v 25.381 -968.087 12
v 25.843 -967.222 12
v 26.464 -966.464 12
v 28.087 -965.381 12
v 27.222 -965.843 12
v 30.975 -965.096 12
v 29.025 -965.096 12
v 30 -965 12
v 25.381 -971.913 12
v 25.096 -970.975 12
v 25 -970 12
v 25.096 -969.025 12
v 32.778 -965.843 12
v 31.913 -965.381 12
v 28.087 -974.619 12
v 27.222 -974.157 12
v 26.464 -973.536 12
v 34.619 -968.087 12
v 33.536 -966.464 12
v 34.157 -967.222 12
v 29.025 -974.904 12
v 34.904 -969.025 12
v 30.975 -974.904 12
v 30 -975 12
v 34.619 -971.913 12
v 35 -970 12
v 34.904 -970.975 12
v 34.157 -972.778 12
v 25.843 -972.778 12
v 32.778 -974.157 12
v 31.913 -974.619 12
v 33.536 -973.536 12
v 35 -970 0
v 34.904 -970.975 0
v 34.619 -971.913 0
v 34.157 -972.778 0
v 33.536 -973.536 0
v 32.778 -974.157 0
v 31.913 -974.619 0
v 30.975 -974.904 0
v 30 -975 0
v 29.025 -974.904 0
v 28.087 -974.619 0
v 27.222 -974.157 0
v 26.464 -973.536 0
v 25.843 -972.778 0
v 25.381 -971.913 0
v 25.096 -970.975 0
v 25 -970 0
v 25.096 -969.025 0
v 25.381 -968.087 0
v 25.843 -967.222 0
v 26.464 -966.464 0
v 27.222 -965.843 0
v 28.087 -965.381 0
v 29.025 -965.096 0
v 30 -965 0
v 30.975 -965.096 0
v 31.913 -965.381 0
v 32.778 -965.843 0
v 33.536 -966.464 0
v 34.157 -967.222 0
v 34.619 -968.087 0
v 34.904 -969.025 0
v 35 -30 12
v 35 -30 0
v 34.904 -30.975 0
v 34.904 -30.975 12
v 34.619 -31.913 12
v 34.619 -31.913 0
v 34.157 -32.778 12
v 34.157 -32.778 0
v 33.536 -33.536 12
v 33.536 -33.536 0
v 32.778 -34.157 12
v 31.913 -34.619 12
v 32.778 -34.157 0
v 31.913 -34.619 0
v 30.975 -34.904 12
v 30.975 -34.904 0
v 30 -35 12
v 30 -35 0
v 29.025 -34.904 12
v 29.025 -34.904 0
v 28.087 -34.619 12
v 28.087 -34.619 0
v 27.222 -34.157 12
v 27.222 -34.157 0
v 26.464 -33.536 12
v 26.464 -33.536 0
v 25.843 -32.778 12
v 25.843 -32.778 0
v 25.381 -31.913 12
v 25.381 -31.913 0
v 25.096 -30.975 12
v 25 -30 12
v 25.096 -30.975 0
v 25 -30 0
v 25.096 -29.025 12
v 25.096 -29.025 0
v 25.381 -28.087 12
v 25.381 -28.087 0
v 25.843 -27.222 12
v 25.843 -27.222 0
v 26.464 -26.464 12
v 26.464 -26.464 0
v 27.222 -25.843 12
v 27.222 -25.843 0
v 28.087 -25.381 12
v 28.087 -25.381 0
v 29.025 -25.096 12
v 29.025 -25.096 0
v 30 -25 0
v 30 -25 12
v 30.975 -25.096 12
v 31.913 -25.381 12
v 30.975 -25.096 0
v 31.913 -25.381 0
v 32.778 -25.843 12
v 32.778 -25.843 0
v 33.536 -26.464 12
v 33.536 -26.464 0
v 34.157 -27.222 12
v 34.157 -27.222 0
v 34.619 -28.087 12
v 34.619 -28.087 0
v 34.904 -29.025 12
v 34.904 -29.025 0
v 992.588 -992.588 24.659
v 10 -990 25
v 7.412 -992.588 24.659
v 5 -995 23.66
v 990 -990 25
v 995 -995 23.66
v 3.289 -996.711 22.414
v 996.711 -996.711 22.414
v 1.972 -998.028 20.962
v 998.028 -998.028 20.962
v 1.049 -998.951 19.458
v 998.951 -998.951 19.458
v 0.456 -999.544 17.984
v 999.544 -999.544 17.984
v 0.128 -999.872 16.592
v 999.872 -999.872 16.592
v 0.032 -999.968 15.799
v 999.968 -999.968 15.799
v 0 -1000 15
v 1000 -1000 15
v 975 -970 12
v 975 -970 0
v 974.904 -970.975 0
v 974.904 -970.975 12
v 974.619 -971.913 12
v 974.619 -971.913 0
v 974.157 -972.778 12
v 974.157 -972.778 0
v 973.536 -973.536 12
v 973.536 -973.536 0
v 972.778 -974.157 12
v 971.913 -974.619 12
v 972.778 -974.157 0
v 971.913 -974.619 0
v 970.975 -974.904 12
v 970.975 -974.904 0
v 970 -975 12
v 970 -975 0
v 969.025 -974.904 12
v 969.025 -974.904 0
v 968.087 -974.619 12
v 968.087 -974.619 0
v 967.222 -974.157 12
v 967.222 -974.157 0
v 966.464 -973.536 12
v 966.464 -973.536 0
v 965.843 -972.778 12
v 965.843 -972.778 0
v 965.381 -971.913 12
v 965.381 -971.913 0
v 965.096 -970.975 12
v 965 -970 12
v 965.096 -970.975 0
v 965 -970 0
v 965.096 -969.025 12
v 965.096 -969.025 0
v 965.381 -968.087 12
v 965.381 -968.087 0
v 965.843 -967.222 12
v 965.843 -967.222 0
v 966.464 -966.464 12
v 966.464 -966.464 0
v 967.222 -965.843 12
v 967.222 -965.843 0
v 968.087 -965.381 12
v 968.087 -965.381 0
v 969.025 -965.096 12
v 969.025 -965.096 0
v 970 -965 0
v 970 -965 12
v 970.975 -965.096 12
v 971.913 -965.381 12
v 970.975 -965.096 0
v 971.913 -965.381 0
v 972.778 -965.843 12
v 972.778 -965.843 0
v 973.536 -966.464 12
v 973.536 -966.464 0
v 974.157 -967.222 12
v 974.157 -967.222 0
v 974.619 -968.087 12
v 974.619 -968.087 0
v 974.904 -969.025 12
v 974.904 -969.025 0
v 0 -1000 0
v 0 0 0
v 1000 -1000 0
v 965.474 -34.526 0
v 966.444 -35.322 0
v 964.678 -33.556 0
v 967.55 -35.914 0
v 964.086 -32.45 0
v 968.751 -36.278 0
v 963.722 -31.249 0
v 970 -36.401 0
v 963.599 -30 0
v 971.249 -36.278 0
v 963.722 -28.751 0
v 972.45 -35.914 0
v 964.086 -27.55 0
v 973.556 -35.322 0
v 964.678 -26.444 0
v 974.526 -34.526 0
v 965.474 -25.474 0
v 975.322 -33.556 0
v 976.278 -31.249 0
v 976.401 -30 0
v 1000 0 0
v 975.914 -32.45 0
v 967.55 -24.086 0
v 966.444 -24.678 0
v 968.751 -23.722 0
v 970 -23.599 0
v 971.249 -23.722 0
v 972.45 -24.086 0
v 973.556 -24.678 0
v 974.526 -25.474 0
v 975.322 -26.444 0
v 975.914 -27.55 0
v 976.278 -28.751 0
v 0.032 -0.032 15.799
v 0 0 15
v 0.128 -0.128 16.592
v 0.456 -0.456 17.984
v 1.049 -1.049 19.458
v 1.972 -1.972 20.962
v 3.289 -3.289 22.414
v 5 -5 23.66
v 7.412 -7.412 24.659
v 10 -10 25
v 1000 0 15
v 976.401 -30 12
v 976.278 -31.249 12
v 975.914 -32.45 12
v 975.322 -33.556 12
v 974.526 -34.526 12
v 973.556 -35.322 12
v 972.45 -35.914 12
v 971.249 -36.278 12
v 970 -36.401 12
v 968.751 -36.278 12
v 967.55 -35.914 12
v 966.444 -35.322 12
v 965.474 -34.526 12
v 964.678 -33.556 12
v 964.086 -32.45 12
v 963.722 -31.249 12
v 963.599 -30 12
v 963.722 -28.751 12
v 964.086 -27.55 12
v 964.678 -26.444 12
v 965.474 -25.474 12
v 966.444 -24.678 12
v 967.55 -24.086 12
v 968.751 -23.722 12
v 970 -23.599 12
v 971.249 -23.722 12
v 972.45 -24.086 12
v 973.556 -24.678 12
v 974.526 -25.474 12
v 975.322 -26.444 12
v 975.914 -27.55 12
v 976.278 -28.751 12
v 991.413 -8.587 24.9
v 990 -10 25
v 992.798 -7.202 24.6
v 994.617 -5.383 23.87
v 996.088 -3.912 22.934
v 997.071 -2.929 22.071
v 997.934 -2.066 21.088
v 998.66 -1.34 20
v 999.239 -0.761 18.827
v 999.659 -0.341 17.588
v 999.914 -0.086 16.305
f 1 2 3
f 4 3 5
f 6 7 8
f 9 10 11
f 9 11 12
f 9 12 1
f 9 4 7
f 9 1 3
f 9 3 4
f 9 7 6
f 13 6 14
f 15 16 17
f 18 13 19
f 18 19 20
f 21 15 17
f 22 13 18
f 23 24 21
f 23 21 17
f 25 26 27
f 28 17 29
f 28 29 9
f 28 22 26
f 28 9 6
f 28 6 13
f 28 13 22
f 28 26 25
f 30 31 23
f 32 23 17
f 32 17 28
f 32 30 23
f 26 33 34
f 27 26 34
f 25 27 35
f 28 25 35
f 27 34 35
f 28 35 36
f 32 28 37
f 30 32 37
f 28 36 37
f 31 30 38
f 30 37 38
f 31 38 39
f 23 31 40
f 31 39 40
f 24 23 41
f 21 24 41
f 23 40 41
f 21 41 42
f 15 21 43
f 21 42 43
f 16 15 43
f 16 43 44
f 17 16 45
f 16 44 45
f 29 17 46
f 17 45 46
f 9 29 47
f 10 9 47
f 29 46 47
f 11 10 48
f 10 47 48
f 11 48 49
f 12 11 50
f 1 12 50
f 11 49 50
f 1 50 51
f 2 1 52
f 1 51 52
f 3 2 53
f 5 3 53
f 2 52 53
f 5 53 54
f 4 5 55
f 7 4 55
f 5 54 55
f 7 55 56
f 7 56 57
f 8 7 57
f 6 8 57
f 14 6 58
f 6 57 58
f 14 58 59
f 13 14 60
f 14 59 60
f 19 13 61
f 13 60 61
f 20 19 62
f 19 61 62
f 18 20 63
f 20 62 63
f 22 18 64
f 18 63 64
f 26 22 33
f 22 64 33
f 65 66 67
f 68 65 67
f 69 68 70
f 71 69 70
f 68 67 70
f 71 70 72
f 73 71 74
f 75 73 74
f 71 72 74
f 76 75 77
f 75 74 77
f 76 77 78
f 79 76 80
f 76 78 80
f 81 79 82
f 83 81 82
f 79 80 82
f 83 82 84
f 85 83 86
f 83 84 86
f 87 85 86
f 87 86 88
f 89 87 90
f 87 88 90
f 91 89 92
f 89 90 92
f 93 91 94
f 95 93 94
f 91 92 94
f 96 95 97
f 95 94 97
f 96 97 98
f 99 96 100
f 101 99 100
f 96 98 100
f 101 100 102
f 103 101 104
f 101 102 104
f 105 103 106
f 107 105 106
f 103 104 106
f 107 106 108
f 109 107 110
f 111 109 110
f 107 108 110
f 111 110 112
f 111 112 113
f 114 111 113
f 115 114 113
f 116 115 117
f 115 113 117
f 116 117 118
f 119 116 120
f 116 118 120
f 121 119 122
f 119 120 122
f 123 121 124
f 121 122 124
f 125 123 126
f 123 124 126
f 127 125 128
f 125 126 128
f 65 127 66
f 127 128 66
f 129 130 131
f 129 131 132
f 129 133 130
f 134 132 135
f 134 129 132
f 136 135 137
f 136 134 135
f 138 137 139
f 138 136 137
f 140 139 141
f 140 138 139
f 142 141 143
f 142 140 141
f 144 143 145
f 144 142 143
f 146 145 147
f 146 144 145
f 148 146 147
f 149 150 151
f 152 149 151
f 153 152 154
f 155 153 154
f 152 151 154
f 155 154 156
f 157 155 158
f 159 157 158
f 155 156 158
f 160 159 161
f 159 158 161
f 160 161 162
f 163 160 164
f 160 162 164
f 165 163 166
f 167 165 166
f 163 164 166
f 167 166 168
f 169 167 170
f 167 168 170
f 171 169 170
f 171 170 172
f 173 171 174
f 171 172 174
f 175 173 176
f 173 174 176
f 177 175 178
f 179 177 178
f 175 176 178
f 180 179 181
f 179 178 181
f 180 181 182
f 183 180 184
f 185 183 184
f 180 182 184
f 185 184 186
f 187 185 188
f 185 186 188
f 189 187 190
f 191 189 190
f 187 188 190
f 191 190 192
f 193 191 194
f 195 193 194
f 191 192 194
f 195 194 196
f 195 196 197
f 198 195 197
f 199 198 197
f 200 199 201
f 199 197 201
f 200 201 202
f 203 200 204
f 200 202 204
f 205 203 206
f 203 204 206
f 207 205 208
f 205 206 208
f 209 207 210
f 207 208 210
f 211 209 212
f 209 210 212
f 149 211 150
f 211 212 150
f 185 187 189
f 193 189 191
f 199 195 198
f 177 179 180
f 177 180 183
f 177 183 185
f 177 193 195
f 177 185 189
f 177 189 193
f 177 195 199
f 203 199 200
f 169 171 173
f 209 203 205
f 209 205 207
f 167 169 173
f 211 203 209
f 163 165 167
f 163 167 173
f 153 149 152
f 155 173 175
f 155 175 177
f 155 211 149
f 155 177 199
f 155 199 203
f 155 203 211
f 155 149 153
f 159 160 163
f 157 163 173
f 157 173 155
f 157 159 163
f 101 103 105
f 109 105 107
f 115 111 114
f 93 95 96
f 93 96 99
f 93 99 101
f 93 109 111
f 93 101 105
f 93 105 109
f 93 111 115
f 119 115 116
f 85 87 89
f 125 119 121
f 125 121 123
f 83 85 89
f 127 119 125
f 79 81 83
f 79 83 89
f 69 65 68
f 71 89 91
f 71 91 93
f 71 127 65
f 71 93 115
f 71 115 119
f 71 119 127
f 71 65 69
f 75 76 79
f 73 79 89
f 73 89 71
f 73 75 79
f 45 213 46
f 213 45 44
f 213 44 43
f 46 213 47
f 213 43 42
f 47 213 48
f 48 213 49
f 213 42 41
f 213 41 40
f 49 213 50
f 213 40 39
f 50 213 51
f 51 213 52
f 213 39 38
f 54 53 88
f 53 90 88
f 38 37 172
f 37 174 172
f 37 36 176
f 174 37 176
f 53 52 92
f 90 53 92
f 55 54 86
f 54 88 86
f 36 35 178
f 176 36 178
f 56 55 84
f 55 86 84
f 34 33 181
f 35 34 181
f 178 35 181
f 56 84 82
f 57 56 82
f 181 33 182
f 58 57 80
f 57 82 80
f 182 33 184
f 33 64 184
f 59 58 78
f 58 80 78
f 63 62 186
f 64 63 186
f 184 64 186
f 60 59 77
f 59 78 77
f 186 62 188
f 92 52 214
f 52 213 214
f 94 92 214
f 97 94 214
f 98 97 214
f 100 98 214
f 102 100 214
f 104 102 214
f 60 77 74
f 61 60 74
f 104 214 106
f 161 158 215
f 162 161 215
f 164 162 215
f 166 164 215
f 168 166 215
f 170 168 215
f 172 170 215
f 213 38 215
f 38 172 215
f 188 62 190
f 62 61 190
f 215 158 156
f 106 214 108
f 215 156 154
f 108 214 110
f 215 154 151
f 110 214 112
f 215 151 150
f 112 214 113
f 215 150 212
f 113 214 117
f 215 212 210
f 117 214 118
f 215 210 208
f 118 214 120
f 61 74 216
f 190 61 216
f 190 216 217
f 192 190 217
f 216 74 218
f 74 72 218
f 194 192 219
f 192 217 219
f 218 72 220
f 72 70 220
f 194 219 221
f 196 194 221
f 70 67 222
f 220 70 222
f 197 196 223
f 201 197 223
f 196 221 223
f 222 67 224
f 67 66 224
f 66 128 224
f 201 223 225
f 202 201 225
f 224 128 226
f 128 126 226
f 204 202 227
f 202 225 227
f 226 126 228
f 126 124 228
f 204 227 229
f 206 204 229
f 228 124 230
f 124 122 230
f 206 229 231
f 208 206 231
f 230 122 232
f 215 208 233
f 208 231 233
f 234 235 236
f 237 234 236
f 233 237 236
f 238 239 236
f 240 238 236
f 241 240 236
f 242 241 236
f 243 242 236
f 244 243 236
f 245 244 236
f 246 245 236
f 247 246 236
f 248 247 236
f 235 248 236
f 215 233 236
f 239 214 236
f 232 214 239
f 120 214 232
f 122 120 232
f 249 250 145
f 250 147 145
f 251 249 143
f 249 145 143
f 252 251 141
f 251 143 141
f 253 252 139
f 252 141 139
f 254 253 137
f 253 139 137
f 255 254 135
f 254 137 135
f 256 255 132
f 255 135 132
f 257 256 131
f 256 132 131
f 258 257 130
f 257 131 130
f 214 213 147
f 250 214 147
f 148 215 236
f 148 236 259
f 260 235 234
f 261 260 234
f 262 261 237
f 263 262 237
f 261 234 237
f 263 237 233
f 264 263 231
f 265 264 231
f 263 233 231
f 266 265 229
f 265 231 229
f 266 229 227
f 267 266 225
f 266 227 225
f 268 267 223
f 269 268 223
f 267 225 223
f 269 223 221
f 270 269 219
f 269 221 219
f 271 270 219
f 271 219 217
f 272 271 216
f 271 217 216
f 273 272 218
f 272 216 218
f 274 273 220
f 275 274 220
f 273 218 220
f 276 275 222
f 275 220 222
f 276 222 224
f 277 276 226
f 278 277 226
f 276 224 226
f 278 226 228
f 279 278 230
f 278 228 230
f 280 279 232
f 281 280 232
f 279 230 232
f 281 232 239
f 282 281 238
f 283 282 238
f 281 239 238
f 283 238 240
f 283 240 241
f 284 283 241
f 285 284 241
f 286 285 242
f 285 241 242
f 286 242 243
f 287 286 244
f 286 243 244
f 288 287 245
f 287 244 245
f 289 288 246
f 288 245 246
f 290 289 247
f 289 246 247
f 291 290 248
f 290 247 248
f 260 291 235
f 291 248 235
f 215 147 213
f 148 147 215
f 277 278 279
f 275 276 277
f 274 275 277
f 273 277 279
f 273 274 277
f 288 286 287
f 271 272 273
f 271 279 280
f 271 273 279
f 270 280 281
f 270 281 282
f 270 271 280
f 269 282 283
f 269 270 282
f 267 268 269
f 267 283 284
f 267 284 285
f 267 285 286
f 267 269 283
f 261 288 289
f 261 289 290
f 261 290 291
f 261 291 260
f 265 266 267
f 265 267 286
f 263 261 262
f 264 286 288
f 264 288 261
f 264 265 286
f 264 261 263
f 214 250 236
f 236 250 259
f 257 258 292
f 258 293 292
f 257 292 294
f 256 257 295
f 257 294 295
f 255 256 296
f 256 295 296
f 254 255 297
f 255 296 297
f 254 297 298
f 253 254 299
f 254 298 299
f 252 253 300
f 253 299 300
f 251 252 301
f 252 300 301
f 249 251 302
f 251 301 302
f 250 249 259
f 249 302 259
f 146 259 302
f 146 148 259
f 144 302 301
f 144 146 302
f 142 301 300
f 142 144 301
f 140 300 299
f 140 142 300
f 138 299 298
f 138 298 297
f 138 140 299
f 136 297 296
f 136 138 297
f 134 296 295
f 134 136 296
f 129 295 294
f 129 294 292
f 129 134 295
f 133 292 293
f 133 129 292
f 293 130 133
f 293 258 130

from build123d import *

# Parameters (mm, degrees)
F0_W      = 1000
F0_H      = 25
F1_DEPTH  = 1000
F2_R      = 10
F3_R      = 5
F4_DEPTH  = 12
F6_R      = 6.401236
F7_DEPTH  = 12
F5_R      = 5
F8_DEPTH  = 12
F9_R      = 5
F10_DEPTH = 12


with BuildPart() as f1:
    # F0 (on Front) → F1 (new body)
    with BuildSketch(Plane.XZ):
        with Locations((500, 12.5)):
            Rectangle(F0_W, F0_H)
    extrude(amount=F1_DEPTH)

    # F2
    f2_edges = [f1.edges().sort_by_distance(p)[0] for p in [
        (500, -1000, 25),
        (1000, -500, 25),
        (500, 0, 25),
        (0, -500, 25),
    ]]
    fillet(f2_edges, radius=F2_R)

    # F3 (on face) → F4 (cut)
    with BuildSketch(Plane(origin=(0, 0, 0), x_dir=(1, 0, 0), z_dir=(0, 0, -1))):
        with Locations((30, 970)):
            Circle(F3_R)
    extrude(amount=-F4_DEPTH, mode=Mode.SUBTRACT)

    # F6 (on face) → F7 (cut)
    with BuildSketch(Plane(origin=(0, 0, 0), x_dir=(1, 0, 0), z_dir=(0, 0, -1))):
        with Locations((970, 30)):
            Circle(F6_R)
    extrude(amount=-F7_DEPTH, mode=Mode.SUBTRACT)

    # F5 (on face) → F8 (cut)
    with BuildSketch(Plane(origin=(0, 0, 0), x_dir=(1, 0, 0), z_dir=(0, 0, -1))):
        with Locations((970, 970)):
            Circle(F5_R)
    extrude(amount=-F8_DEPTH, mode=Mode.SUBTRACT)

    # F9 (on face) → F10 (cut)
    with BuildSketch(Plane(origin=(0, 0, 0), x_dir=(1, 0, 0), z_dir=(0, 0, -1))):
        with Locations((30, 30)):
            Circle(F9_R)
    extrude(amount=-F10_DEPTH, mode=Mode.SUBTRACT)


solid = f1.part
